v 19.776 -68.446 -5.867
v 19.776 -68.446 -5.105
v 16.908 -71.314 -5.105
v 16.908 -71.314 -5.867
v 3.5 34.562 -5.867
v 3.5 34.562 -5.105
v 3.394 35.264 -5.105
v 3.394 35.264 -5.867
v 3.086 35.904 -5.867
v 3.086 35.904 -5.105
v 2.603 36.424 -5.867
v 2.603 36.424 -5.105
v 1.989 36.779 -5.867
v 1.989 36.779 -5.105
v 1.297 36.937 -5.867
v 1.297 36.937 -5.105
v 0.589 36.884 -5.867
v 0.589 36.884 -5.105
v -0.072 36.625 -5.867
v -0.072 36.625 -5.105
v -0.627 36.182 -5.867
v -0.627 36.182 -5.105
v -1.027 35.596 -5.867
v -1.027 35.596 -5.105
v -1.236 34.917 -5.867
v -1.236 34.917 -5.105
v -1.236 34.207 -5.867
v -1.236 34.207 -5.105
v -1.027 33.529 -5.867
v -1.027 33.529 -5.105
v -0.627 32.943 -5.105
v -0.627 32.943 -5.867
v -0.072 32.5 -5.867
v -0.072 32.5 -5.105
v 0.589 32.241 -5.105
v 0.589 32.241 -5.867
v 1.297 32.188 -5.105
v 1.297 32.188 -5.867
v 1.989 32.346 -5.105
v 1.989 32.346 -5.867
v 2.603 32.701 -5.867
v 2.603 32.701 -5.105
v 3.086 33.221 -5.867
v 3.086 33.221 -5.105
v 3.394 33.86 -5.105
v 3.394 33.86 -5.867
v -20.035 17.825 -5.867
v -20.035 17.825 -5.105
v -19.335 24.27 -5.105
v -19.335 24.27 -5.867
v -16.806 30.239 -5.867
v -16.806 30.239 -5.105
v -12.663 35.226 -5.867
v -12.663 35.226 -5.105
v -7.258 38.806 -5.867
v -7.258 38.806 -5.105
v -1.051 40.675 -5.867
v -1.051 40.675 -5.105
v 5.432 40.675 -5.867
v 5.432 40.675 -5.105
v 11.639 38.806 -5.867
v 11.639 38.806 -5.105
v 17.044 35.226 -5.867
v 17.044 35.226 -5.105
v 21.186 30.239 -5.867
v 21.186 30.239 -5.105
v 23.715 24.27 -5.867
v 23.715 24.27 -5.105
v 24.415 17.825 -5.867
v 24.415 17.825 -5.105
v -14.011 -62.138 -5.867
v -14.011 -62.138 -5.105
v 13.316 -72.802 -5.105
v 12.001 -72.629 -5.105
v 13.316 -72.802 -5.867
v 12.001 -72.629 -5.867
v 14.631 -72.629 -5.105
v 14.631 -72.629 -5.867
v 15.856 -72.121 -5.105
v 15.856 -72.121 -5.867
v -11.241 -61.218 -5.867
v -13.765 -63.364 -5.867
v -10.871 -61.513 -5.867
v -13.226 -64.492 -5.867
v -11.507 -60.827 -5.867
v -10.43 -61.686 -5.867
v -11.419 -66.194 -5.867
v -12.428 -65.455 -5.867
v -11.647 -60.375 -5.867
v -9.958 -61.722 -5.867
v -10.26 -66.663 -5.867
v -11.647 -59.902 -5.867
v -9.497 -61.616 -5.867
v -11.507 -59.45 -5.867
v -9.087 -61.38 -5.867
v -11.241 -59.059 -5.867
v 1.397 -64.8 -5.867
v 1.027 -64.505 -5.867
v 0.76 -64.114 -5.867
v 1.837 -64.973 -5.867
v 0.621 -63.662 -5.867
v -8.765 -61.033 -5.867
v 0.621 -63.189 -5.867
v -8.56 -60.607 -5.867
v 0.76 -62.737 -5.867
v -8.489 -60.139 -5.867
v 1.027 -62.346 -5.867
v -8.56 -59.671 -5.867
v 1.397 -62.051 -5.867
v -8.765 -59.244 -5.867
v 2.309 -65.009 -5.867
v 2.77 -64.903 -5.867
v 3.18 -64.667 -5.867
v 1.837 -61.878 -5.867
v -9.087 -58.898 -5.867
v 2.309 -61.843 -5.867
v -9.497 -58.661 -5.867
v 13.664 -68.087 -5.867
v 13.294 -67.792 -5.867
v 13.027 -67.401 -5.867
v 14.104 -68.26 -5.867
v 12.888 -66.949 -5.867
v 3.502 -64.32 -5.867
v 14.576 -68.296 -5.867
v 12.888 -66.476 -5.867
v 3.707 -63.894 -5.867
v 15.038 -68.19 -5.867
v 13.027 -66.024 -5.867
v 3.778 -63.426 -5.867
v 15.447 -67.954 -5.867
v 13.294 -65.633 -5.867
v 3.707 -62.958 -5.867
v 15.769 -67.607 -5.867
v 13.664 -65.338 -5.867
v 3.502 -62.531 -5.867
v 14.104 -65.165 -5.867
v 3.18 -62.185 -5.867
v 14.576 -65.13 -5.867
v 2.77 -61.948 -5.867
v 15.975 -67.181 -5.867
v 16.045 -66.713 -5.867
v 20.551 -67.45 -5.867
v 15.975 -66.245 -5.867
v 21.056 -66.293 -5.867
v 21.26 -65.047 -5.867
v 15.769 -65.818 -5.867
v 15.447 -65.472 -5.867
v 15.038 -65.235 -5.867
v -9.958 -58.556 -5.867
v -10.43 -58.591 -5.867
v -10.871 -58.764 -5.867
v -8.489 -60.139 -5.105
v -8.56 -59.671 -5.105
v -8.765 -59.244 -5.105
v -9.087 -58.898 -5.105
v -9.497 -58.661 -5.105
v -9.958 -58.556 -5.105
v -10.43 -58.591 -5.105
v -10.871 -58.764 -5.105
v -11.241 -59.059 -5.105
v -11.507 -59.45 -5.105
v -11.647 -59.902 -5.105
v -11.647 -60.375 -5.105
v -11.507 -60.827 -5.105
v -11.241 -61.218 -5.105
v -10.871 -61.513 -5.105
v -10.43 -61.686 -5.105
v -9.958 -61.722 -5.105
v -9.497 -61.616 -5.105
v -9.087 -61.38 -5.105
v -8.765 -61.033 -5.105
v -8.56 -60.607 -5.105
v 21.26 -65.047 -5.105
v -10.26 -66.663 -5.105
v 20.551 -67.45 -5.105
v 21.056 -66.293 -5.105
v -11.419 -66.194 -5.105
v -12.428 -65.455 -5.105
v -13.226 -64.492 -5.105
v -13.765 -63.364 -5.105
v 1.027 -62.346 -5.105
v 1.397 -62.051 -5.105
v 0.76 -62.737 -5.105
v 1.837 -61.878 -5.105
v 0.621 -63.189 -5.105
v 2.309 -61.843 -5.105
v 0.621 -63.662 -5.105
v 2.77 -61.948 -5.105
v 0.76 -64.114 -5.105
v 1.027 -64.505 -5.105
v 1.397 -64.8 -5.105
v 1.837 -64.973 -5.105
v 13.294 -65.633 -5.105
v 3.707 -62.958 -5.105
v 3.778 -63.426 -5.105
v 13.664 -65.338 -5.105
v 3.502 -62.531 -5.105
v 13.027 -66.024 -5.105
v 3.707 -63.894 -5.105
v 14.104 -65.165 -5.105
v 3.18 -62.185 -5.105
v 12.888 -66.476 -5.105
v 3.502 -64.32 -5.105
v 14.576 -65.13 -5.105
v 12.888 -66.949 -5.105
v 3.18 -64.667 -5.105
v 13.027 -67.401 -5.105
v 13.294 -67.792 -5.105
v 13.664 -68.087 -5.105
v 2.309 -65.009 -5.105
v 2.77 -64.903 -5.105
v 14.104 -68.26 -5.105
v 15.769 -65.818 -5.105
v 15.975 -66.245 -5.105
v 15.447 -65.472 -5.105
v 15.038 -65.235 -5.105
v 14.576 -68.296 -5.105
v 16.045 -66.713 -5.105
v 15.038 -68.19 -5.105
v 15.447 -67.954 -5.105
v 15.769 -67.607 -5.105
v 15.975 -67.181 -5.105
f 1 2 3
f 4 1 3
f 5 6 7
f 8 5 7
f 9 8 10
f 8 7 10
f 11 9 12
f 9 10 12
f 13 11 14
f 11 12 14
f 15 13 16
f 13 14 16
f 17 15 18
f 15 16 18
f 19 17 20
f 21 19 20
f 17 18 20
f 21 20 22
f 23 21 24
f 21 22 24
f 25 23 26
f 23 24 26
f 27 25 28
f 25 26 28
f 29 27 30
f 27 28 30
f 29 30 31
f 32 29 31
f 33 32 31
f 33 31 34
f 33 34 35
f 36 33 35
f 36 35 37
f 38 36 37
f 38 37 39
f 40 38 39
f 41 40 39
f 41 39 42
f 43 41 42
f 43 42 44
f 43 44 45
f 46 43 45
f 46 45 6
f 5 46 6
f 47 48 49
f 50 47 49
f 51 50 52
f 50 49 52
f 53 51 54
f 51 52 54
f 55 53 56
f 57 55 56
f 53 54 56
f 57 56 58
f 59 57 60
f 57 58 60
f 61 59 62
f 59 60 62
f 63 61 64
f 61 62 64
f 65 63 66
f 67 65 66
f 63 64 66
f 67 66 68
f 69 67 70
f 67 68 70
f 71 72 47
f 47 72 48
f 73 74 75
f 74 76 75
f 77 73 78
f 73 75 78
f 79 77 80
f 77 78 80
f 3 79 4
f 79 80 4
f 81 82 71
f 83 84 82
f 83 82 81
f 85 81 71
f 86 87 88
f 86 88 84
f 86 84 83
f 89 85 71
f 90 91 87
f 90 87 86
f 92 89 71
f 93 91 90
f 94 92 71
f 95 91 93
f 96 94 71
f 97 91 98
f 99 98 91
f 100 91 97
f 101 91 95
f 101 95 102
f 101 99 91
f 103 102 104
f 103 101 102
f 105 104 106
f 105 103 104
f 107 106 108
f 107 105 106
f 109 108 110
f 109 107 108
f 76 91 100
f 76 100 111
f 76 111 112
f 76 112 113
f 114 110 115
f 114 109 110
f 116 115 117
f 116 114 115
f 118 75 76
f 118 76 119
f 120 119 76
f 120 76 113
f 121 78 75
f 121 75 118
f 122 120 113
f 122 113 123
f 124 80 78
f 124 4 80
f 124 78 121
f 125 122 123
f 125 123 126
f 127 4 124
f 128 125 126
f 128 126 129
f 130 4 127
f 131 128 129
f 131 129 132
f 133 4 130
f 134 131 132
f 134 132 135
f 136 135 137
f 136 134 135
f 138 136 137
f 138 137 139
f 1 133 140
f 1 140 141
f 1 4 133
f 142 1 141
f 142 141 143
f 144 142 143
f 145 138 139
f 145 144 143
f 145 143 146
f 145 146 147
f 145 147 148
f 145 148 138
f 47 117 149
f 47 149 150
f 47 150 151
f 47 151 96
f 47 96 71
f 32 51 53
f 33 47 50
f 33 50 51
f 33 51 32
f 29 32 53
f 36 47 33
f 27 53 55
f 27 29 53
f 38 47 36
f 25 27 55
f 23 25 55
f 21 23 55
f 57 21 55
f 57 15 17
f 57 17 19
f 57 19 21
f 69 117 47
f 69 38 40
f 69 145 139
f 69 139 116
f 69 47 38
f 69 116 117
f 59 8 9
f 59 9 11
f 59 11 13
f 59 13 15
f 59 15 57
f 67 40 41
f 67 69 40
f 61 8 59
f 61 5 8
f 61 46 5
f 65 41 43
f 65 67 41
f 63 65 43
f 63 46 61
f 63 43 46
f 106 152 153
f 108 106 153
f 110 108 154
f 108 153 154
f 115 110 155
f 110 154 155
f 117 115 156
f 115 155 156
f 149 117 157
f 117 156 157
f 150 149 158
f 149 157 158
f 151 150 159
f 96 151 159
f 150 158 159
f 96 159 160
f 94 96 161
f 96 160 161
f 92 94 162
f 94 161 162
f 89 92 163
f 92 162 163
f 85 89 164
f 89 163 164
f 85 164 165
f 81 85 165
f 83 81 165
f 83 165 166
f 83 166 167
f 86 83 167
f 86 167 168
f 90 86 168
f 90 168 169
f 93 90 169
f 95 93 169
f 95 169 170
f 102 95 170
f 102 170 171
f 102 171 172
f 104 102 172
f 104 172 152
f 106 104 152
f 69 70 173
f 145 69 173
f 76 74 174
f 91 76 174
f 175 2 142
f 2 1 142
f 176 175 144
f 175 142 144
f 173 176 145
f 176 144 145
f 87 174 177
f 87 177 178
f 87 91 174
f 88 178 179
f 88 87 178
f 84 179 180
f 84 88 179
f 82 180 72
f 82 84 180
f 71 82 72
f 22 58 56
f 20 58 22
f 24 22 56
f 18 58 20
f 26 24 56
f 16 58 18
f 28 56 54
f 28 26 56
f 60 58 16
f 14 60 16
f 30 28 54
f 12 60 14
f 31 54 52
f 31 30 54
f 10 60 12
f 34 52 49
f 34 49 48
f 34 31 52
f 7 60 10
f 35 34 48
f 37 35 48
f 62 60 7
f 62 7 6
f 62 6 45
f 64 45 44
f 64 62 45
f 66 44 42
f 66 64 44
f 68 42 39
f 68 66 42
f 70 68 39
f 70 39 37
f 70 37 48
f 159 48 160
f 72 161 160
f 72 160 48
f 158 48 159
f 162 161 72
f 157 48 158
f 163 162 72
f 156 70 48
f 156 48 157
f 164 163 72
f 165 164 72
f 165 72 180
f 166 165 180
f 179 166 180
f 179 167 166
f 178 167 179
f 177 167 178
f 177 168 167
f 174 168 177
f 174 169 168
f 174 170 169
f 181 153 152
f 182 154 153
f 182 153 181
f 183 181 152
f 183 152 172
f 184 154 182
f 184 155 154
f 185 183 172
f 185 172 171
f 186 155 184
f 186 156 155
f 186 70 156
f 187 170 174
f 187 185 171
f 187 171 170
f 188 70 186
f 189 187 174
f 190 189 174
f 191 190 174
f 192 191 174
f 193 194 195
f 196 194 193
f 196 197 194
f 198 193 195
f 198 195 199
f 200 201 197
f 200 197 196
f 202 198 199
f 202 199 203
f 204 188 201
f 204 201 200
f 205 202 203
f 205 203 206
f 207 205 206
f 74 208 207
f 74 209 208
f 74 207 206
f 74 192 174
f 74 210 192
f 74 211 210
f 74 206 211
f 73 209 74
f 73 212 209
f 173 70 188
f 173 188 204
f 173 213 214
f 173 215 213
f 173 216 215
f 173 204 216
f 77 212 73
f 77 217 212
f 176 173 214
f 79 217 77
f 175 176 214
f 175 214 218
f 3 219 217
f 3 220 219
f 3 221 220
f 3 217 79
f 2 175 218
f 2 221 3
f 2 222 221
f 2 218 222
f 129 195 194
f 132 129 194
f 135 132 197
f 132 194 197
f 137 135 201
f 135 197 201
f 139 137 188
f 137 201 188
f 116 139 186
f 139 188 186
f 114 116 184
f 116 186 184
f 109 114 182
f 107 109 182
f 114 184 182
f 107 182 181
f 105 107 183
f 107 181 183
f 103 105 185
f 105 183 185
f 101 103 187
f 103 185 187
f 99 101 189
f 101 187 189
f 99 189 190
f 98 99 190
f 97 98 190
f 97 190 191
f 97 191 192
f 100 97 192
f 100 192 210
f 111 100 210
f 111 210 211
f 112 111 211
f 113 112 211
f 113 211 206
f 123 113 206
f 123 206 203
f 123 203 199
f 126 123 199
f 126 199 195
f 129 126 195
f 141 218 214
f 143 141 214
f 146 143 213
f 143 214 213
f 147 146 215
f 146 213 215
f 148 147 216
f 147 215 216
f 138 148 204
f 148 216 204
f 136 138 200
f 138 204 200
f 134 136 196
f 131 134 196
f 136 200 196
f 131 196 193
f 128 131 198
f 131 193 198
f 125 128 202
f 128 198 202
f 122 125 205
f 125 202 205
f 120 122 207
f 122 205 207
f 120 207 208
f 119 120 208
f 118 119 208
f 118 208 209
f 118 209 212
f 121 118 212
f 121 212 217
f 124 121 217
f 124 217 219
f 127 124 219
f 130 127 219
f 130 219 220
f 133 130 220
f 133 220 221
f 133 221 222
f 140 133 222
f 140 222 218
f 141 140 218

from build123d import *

# Parameters (mm, degrees)
F1_DEPTH = 50.8
F2_W     = 141.4932012558
F2_H     = 197.677500546
F3_DEPTH = 25.4
F4_R     = 1.5875
F5_DEPTH = 25.4
F6_R     = 2.38125
F7_DEPTH = 25.4
F8_R     = 5.08


with BuildPart() as f1:
    # F0 (on Right) → F1 (new body, symmetric)
    with BuildSketch(Plane.YZ):
        Polygon((-9.8313118777, -5.1045094135), (-73.3876270169, -5.1045094135), (-73.3876270169, -5.8665094135), (-9.8313118777, -5.8665094135), (40.9123729831, -5.8665094135), (40.9123729831, -5.1045094135), align=None)
    extrude(amount=F1_DEPTH, both=True)

    # F2 (on Top) → F3 (cut)
    with BuildSketch(Plane.XY):
        with Locations((-0.8716285229, -40.7481454313)):
            Rectangle(F2_W, F2_H)
        with BuildLine():
            Line((-13.740606685, -65.7309788432), (-20.0346057486, 17.8250920772))
            ThreePointArc((-20.0346057486, 17.8250920772), (2.1903942514, 40.9123729831), (24.4153942514, 17.8250920772))
            Line((24.4153942514, 17.8250920772), (21.184393315, -67.0376270169))
            Line((21.184393315, -67.0376270169), (14.834393315, -73.3876270169))
            Line((14.834393315, -73.3876270169), (-13.740606685, -65.7309788432))
        make_face(mode=Mode.SUBTRACT)
    extrude(amount=-F3_DEPTH, mode=Mode.SUBTRACT)

    # F4 (on face) → F5 (cut)
    with BuildSketch(Plane.XY.offset(-5.1045094135)):
        with Locations((-10.0768637425, -60.1386720603)):
            Circle(F4_R)
        with Locations((2.1903942514, -63.4256739331)):
            Circle(F4_R)
        with Locations((14.4576522453, -66.7126758059)):
            Circle(F4_R)
    extrude(amount=-F5_DEPTH, mode=Mode.SUBTRACT)

    # F6 (on face) → F7 (cut)
    with BuildSketch(Plane.XY.offset(-5.1045094135)):
        with Locations((1.1186605513, 34.5623729831)):
            Circle(F6_R)
    extrude(amount=-F7_DEPTH, mode=Mode.SUBTRACT)

    # F8
    f8_edges = [f1.edges().sort_by_distance(p)[0] for p in [
        (-13.740607, -65.730979, -5.485509),
        (14.834393, -73.387627, -5.485509),
        (21.184393, -67.037627, -5.485509),
    ]]
    fillet(f8_edges, radius=F8_R)


solid = f1.part
